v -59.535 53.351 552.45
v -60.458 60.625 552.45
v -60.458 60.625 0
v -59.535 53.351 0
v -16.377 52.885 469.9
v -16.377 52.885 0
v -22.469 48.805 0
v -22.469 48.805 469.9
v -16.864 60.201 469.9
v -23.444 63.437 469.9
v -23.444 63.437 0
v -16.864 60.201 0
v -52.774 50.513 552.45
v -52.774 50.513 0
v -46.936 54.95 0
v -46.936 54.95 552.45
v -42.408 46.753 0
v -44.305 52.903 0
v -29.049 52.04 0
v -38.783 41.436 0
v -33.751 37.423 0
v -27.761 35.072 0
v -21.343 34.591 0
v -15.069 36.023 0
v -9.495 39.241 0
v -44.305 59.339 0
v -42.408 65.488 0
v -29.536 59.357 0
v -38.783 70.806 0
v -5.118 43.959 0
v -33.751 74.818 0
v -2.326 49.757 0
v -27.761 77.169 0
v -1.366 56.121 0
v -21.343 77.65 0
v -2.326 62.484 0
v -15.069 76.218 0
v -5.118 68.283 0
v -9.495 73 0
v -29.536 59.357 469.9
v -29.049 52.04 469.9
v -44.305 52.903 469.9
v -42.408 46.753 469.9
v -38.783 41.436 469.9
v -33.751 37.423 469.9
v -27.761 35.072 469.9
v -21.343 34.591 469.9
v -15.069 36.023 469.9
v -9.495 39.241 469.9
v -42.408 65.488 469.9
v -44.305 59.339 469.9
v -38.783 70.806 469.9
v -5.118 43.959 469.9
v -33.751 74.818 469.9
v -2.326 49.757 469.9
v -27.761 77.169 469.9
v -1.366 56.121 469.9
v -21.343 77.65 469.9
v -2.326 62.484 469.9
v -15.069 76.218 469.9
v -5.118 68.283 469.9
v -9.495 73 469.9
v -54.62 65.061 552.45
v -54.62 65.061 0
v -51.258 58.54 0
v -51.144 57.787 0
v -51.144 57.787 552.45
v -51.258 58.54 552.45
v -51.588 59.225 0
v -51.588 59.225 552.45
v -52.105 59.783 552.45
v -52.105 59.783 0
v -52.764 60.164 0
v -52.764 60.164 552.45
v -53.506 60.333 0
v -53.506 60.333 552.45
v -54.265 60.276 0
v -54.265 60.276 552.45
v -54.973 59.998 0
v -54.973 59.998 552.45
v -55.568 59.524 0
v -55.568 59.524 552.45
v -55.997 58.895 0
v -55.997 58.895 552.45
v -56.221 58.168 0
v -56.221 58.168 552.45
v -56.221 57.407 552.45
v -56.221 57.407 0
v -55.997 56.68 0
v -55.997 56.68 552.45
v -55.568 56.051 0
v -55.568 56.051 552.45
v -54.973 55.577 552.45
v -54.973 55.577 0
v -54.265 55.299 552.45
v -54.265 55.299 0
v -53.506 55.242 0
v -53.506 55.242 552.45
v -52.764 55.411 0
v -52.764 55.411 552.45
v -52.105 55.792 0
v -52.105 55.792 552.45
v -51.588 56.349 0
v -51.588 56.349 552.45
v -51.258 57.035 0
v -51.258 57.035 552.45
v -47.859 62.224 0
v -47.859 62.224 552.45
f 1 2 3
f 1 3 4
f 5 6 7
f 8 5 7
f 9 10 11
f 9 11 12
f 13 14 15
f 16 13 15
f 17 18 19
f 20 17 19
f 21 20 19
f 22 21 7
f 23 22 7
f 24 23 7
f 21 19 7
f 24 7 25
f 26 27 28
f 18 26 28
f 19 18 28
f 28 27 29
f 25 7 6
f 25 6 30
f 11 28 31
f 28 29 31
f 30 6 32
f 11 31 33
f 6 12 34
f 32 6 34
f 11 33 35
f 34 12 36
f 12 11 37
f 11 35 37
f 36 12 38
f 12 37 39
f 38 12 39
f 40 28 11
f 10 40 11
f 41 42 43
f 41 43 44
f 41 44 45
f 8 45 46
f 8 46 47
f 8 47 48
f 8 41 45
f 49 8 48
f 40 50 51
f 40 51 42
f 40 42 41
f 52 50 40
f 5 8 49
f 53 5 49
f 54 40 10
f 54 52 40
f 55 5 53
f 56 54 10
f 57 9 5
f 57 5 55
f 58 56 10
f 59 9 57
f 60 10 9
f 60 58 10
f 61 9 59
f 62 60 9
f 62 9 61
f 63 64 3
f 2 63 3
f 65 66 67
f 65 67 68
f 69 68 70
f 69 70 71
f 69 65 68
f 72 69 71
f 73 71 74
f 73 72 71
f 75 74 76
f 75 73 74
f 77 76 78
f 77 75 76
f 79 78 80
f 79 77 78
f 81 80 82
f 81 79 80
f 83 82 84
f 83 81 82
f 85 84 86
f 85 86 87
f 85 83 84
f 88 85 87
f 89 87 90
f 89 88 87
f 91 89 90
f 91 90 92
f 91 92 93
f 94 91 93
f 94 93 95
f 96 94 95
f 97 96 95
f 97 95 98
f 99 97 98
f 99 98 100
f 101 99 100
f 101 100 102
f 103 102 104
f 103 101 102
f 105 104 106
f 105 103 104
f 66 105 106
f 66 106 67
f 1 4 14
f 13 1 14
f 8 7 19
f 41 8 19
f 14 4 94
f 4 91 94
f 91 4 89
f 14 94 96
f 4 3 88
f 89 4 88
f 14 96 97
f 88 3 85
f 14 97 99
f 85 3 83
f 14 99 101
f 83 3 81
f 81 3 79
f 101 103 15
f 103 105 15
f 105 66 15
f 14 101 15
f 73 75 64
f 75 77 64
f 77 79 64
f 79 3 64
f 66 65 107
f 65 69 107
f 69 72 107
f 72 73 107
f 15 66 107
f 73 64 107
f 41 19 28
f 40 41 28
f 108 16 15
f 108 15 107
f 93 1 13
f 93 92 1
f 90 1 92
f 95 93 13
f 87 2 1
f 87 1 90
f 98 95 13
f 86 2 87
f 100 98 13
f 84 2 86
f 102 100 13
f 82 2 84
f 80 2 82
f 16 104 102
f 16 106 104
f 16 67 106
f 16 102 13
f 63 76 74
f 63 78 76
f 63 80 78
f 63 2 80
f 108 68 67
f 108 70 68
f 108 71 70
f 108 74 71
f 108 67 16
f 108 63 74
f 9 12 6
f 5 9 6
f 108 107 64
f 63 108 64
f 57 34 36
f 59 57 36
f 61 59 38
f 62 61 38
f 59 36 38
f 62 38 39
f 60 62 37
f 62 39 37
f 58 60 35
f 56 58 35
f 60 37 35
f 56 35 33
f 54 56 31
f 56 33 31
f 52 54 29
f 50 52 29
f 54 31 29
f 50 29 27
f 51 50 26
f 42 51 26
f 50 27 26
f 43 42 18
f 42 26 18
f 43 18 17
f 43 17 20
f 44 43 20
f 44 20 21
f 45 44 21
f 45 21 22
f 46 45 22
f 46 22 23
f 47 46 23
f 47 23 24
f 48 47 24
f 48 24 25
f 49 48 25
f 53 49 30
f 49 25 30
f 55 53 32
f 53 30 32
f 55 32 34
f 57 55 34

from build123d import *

# Parameters (mm, degrees)
F0_R     = 2.5527
F1_DEPTH = 552.45
F2_R     = 21.59
F3_DEPTH = 469.9


with BuildPart() as f1:
    # F0 (on Top) → F1 (new body)
    with BuildSketch(Plane.XY):
        Polygon((-52.773612, 50.513388), (-46.935875, 54.950072), (-47.859286, 62.224042), (-54.620435, 65.061329), (-60.458173, 60.624646), (-59.534761, 53.350675), align=None)
        with Locations((-53.697024, 57.787359)):
            Circle(F0_R, mode=Mode.SUBTRACT)
    extrude(amount=F1_DEPTH)


with BuildPart() as f3:
    # F2 (on Top) → F3 (new body)
    with BuildSketch(Plane.XY):
        with Locations((-22.956457, 56.120712)):
            Circle(F2_R)
        Polygon((-16.376775, 52.884802), (-22.468997, 48.804585), (-29.048679, 52.040496), (-29.536139, 59.356623), (-23.443917, 63.436839), (-16.864235, 60.200929), align=None, mode=Mode.SUBTRACT)
    extrude(amount=F3_DEPTH)


solid = Compound([f1.part, f3.part])
